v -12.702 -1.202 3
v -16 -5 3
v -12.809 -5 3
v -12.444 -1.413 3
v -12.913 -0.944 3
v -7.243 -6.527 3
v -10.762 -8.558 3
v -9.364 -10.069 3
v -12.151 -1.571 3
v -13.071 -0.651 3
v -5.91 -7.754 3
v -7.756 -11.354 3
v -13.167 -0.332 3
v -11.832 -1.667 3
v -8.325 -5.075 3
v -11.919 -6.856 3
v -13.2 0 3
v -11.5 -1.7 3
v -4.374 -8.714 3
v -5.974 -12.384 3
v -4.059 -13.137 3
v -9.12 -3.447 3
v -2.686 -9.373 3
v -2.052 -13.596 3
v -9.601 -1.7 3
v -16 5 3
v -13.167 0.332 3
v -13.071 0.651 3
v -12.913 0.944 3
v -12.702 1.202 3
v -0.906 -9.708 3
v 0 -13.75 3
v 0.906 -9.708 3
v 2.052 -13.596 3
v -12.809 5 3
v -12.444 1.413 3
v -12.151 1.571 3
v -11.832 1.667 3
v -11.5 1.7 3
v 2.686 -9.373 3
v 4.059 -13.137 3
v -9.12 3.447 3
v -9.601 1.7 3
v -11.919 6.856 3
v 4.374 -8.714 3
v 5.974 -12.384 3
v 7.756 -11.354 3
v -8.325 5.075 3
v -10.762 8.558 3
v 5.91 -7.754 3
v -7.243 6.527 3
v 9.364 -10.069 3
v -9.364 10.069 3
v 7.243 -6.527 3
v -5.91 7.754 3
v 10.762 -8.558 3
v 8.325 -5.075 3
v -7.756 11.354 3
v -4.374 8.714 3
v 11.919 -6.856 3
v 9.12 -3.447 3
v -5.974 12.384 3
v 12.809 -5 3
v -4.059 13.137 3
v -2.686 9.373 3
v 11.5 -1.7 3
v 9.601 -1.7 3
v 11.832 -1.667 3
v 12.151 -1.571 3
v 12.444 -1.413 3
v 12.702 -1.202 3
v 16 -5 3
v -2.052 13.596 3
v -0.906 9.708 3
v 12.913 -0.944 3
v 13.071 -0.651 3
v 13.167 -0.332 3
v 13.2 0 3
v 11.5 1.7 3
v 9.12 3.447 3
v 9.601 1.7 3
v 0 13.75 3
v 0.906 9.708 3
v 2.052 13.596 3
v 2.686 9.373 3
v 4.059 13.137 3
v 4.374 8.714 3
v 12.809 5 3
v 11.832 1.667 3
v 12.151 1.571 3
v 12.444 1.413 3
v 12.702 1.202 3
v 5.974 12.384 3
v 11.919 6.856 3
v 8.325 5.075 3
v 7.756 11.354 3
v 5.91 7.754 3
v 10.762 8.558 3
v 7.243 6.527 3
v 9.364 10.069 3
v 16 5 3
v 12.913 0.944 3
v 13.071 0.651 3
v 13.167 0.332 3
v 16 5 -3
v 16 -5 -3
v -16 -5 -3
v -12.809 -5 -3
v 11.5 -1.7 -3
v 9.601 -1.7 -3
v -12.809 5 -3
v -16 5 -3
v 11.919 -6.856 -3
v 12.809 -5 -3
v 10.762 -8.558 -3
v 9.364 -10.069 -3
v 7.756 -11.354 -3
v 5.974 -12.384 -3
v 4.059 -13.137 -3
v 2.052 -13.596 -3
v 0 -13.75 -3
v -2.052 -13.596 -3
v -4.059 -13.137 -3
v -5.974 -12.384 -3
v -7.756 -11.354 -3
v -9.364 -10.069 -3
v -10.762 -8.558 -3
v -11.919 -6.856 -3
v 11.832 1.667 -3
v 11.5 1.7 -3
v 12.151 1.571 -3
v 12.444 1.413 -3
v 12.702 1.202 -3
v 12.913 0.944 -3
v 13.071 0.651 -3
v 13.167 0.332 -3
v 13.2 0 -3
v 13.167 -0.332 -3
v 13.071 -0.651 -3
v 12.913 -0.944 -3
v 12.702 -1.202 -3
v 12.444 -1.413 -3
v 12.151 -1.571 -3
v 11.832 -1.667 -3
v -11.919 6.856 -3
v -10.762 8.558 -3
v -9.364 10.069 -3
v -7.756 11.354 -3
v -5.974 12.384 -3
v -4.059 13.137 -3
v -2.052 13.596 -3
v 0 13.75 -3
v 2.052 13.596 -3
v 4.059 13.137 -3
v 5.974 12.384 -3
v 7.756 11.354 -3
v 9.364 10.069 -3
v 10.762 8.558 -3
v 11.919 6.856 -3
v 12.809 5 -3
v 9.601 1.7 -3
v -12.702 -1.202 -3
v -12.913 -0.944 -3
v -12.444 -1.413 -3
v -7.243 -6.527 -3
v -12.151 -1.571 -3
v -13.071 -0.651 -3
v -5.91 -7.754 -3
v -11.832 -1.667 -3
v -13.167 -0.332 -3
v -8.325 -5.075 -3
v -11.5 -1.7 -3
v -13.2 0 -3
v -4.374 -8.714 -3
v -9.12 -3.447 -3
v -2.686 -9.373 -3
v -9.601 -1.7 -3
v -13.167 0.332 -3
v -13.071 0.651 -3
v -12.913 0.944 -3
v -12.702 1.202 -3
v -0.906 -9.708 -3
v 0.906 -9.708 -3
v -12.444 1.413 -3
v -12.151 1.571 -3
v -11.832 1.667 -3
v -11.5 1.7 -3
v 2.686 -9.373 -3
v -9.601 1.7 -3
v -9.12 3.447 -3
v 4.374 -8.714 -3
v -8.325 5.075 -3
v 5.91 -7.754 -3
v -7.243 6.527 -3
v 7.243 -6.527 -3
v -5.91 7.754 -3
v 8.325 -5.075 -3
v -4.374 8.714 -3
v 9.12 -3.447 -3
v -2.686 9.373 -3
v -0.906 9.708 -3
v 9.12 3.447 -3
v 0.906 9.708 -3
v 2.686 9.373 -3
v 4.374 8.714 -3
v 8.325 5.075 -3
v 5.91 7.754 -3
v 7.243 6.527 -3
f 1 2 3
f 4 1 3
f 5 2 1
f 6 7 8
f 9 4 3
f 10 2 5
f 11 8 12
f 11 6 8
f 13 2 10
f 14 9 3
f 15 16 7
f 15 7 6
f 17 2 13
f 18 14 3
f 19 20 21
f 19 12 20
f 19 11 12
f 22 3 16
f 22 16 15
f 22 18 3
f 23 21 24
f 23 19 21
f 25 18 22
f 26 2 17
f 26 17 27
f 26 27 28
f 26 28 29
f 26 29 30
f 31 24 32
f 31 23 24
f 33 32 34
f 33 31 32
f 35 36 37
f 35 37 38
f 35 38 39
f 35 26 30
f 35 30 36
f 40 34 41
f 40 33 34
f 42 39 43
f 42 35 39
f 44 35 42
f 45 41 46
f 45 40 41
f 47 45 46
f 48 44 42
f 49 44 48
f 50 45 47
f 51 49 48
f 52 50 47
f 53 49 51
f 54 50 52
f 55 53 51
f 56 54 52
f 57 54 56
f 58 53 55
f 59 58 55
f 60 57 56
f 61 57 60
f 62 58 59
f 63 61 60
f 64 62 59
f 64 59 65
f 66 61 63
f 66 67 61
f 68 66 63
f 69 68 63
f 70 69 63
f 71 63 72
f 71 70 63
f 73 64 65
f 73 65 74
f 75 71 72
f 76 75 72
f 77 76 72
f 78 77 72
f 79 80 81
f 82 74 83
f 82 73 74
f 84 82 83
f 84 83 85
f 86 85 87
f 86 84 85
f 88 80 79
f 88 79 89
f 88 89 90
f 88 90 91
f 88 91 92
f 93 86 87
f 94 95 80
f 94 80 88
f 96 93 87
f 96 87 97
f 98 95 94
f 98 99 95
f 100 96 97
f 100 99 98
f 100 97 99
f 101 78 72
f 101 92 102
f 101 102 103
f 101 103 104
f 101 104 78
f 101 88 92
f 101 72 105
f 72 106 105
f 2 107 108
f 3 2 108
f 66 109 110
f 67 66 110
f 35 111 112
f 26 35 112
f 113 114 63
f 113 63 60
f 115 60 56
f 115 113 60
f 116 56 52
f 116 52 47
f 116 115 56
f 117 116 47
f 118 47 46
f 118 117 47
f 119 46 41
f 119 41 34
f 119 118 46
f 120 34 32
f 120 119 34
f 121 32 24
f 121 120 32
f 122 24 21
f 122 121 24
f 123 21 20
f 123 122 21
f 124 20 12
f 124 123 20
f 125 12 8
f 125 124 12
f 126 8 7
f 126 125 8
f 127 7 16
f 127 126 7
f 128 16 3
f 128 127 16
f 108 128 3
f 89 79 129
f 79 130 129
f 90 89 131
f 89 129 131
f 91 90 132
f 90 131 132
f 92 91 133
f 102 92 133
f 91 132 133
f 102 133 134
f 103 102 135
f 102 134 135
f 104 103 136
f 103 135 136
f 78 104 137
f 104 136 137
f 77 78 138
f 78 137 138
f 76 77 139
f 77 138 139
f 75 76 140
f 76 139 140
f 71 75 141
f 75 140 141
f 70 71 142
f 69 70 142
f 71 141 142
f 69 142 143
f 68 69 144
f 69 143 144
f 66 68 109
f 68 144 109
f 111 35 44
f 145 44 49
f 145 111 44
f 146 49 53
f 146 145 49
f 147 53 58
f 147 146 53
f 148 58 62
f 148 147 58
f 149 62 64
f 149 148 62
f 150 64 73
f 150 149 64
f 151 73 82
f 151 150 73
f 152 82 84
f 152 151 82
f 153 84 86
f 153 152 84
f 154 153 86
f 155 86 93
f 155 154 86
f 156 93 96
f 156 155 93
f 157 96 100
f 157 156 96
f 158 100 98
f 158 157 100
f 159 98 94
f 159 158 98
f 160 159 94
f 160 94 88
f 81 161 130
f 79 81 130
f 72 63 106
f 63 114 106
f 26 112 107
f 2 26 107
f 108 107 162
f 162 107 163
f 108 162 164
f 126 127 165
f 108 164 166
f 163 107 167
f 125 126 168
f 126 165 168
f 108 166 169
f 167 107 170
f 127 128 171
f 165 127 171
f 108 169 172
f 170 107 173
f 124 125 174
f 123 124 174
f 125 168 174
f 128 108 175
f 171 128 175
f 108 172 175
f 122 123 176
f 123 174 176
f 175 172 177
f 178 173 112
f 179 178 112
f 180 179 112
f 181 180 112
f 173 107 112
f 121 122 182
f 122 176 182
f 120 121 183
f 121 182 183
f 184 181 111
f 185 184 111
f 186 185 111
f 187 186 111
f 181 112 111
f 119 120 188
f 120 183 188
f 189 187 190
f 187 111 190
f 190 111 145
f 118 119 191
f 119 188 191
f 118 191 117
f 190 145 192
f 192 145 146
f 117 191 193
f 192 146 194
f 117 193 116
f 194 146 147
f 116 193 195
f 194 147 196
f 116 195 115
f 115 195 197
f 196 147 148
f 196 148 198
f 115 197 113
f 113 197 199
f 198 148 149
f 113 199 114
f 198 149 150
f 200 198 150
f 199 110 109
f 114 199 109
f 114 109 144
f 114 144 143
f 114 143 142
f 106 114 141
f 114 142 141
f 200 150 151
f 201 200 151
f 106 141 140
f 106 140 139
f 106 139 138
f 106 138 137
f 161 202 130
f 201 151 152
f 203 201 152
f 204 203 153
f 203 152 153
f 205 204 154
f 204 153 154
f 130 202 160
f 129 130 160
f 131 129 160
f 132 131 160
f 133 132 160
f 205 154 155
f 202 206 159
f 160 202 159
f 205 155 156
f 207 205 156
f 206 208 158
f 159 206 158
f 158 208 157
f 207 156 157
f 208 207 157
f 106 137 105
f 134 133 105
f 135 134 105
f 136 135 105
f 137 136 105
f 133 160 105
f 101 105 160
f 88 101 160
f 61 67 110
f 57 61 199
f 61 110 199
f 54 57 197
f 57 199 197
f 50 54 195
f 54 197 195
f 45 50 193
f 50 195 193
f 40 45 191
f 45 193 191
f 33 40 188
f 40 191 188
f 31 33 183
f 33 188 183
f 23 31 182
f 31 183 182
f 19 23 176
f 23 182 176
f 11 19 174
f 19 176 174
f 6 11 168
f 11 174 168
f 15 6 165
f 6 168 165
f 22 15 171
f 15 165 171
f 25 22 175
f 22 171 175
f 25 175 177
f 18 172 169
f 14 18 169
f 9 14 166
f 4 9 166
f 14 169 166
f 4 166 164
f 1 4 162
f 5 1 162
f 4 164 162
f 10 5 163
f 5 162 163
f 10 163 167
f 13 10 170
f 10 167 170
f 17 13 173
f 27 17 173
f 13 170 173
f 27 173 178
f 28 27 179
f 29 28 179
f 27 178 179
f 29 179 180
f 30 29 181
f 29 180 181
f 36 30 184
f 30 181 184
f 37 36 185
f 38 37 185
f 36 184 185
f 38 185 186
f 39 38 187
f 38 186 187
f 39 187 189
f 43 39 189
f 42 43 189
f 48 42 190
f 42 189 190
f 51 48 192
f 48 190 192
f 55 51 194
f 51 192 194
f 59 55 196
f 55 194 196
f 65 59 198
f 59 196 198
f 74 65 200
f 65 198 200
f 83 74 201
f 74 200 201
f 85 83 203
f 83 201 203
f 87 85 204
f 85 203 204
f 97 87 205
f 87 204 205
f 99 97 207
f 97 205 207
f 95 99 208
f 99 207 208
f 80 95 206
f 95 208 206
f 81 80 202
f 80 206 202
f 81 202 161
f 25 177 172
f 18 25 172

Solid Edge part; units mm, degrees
sketch "Sketch1" plane through (0, 0, 0) normal (0, 0, 1) x (1, 0, 0)
  circle A0 centre (0, 0) radius 13.75
  circle A1 centre (0, 0) radius 9.75
  dimension "D1" = 4
  dimension "D2" = 19.5
extrude "Protrusion1" add sketch "Sketch1" along normal mid plane 6
sketch "Sketch2" plane through (0, 0, 0) normal (0, 0, 1) x (1, 0, 0)
  line L0 (-11.5, 0) -> (-11.5, 5)
  line L1 (-11.5, 5) -> (-16, 5)
  line L2 (-16, 5) -> (-16, -5)
  line L3 (-16, -5) -> (-11.5, -5)
  line L4 (-11.5, -5) -> (-11.5, 0)
  dimension "D1" = 11.5
  dimension "D2" = 7
extrude "ExtrudedProtrusion_2" add sketch "Sketch2" along normal mid plane 6
sketch "Sketch3" plane through (-1.125, 0, 3) normal (0, 0, 1) x (0, -1, 0)
  line L0 (-1.7, -10.375) -> (-1.7, -6.9571)
  line L1 (-1.7, -6.9571) -> (1.7, -6.9571)
  line L2 (1.7, -6.9571) -> (1.7, -10.375)
  arc A0 (1.7, -10.375) -> (-1.7, -10.375) centre (0, -10.375) cw
extrude "Cutout1" cut sketch "Sketch3" along normal through all and the other way through all
mirror "Mirror1" about plane through (0, 0, 0) normal (1, 0, 0) of "ExtrudedProtrusion_2", "Cutout1"
